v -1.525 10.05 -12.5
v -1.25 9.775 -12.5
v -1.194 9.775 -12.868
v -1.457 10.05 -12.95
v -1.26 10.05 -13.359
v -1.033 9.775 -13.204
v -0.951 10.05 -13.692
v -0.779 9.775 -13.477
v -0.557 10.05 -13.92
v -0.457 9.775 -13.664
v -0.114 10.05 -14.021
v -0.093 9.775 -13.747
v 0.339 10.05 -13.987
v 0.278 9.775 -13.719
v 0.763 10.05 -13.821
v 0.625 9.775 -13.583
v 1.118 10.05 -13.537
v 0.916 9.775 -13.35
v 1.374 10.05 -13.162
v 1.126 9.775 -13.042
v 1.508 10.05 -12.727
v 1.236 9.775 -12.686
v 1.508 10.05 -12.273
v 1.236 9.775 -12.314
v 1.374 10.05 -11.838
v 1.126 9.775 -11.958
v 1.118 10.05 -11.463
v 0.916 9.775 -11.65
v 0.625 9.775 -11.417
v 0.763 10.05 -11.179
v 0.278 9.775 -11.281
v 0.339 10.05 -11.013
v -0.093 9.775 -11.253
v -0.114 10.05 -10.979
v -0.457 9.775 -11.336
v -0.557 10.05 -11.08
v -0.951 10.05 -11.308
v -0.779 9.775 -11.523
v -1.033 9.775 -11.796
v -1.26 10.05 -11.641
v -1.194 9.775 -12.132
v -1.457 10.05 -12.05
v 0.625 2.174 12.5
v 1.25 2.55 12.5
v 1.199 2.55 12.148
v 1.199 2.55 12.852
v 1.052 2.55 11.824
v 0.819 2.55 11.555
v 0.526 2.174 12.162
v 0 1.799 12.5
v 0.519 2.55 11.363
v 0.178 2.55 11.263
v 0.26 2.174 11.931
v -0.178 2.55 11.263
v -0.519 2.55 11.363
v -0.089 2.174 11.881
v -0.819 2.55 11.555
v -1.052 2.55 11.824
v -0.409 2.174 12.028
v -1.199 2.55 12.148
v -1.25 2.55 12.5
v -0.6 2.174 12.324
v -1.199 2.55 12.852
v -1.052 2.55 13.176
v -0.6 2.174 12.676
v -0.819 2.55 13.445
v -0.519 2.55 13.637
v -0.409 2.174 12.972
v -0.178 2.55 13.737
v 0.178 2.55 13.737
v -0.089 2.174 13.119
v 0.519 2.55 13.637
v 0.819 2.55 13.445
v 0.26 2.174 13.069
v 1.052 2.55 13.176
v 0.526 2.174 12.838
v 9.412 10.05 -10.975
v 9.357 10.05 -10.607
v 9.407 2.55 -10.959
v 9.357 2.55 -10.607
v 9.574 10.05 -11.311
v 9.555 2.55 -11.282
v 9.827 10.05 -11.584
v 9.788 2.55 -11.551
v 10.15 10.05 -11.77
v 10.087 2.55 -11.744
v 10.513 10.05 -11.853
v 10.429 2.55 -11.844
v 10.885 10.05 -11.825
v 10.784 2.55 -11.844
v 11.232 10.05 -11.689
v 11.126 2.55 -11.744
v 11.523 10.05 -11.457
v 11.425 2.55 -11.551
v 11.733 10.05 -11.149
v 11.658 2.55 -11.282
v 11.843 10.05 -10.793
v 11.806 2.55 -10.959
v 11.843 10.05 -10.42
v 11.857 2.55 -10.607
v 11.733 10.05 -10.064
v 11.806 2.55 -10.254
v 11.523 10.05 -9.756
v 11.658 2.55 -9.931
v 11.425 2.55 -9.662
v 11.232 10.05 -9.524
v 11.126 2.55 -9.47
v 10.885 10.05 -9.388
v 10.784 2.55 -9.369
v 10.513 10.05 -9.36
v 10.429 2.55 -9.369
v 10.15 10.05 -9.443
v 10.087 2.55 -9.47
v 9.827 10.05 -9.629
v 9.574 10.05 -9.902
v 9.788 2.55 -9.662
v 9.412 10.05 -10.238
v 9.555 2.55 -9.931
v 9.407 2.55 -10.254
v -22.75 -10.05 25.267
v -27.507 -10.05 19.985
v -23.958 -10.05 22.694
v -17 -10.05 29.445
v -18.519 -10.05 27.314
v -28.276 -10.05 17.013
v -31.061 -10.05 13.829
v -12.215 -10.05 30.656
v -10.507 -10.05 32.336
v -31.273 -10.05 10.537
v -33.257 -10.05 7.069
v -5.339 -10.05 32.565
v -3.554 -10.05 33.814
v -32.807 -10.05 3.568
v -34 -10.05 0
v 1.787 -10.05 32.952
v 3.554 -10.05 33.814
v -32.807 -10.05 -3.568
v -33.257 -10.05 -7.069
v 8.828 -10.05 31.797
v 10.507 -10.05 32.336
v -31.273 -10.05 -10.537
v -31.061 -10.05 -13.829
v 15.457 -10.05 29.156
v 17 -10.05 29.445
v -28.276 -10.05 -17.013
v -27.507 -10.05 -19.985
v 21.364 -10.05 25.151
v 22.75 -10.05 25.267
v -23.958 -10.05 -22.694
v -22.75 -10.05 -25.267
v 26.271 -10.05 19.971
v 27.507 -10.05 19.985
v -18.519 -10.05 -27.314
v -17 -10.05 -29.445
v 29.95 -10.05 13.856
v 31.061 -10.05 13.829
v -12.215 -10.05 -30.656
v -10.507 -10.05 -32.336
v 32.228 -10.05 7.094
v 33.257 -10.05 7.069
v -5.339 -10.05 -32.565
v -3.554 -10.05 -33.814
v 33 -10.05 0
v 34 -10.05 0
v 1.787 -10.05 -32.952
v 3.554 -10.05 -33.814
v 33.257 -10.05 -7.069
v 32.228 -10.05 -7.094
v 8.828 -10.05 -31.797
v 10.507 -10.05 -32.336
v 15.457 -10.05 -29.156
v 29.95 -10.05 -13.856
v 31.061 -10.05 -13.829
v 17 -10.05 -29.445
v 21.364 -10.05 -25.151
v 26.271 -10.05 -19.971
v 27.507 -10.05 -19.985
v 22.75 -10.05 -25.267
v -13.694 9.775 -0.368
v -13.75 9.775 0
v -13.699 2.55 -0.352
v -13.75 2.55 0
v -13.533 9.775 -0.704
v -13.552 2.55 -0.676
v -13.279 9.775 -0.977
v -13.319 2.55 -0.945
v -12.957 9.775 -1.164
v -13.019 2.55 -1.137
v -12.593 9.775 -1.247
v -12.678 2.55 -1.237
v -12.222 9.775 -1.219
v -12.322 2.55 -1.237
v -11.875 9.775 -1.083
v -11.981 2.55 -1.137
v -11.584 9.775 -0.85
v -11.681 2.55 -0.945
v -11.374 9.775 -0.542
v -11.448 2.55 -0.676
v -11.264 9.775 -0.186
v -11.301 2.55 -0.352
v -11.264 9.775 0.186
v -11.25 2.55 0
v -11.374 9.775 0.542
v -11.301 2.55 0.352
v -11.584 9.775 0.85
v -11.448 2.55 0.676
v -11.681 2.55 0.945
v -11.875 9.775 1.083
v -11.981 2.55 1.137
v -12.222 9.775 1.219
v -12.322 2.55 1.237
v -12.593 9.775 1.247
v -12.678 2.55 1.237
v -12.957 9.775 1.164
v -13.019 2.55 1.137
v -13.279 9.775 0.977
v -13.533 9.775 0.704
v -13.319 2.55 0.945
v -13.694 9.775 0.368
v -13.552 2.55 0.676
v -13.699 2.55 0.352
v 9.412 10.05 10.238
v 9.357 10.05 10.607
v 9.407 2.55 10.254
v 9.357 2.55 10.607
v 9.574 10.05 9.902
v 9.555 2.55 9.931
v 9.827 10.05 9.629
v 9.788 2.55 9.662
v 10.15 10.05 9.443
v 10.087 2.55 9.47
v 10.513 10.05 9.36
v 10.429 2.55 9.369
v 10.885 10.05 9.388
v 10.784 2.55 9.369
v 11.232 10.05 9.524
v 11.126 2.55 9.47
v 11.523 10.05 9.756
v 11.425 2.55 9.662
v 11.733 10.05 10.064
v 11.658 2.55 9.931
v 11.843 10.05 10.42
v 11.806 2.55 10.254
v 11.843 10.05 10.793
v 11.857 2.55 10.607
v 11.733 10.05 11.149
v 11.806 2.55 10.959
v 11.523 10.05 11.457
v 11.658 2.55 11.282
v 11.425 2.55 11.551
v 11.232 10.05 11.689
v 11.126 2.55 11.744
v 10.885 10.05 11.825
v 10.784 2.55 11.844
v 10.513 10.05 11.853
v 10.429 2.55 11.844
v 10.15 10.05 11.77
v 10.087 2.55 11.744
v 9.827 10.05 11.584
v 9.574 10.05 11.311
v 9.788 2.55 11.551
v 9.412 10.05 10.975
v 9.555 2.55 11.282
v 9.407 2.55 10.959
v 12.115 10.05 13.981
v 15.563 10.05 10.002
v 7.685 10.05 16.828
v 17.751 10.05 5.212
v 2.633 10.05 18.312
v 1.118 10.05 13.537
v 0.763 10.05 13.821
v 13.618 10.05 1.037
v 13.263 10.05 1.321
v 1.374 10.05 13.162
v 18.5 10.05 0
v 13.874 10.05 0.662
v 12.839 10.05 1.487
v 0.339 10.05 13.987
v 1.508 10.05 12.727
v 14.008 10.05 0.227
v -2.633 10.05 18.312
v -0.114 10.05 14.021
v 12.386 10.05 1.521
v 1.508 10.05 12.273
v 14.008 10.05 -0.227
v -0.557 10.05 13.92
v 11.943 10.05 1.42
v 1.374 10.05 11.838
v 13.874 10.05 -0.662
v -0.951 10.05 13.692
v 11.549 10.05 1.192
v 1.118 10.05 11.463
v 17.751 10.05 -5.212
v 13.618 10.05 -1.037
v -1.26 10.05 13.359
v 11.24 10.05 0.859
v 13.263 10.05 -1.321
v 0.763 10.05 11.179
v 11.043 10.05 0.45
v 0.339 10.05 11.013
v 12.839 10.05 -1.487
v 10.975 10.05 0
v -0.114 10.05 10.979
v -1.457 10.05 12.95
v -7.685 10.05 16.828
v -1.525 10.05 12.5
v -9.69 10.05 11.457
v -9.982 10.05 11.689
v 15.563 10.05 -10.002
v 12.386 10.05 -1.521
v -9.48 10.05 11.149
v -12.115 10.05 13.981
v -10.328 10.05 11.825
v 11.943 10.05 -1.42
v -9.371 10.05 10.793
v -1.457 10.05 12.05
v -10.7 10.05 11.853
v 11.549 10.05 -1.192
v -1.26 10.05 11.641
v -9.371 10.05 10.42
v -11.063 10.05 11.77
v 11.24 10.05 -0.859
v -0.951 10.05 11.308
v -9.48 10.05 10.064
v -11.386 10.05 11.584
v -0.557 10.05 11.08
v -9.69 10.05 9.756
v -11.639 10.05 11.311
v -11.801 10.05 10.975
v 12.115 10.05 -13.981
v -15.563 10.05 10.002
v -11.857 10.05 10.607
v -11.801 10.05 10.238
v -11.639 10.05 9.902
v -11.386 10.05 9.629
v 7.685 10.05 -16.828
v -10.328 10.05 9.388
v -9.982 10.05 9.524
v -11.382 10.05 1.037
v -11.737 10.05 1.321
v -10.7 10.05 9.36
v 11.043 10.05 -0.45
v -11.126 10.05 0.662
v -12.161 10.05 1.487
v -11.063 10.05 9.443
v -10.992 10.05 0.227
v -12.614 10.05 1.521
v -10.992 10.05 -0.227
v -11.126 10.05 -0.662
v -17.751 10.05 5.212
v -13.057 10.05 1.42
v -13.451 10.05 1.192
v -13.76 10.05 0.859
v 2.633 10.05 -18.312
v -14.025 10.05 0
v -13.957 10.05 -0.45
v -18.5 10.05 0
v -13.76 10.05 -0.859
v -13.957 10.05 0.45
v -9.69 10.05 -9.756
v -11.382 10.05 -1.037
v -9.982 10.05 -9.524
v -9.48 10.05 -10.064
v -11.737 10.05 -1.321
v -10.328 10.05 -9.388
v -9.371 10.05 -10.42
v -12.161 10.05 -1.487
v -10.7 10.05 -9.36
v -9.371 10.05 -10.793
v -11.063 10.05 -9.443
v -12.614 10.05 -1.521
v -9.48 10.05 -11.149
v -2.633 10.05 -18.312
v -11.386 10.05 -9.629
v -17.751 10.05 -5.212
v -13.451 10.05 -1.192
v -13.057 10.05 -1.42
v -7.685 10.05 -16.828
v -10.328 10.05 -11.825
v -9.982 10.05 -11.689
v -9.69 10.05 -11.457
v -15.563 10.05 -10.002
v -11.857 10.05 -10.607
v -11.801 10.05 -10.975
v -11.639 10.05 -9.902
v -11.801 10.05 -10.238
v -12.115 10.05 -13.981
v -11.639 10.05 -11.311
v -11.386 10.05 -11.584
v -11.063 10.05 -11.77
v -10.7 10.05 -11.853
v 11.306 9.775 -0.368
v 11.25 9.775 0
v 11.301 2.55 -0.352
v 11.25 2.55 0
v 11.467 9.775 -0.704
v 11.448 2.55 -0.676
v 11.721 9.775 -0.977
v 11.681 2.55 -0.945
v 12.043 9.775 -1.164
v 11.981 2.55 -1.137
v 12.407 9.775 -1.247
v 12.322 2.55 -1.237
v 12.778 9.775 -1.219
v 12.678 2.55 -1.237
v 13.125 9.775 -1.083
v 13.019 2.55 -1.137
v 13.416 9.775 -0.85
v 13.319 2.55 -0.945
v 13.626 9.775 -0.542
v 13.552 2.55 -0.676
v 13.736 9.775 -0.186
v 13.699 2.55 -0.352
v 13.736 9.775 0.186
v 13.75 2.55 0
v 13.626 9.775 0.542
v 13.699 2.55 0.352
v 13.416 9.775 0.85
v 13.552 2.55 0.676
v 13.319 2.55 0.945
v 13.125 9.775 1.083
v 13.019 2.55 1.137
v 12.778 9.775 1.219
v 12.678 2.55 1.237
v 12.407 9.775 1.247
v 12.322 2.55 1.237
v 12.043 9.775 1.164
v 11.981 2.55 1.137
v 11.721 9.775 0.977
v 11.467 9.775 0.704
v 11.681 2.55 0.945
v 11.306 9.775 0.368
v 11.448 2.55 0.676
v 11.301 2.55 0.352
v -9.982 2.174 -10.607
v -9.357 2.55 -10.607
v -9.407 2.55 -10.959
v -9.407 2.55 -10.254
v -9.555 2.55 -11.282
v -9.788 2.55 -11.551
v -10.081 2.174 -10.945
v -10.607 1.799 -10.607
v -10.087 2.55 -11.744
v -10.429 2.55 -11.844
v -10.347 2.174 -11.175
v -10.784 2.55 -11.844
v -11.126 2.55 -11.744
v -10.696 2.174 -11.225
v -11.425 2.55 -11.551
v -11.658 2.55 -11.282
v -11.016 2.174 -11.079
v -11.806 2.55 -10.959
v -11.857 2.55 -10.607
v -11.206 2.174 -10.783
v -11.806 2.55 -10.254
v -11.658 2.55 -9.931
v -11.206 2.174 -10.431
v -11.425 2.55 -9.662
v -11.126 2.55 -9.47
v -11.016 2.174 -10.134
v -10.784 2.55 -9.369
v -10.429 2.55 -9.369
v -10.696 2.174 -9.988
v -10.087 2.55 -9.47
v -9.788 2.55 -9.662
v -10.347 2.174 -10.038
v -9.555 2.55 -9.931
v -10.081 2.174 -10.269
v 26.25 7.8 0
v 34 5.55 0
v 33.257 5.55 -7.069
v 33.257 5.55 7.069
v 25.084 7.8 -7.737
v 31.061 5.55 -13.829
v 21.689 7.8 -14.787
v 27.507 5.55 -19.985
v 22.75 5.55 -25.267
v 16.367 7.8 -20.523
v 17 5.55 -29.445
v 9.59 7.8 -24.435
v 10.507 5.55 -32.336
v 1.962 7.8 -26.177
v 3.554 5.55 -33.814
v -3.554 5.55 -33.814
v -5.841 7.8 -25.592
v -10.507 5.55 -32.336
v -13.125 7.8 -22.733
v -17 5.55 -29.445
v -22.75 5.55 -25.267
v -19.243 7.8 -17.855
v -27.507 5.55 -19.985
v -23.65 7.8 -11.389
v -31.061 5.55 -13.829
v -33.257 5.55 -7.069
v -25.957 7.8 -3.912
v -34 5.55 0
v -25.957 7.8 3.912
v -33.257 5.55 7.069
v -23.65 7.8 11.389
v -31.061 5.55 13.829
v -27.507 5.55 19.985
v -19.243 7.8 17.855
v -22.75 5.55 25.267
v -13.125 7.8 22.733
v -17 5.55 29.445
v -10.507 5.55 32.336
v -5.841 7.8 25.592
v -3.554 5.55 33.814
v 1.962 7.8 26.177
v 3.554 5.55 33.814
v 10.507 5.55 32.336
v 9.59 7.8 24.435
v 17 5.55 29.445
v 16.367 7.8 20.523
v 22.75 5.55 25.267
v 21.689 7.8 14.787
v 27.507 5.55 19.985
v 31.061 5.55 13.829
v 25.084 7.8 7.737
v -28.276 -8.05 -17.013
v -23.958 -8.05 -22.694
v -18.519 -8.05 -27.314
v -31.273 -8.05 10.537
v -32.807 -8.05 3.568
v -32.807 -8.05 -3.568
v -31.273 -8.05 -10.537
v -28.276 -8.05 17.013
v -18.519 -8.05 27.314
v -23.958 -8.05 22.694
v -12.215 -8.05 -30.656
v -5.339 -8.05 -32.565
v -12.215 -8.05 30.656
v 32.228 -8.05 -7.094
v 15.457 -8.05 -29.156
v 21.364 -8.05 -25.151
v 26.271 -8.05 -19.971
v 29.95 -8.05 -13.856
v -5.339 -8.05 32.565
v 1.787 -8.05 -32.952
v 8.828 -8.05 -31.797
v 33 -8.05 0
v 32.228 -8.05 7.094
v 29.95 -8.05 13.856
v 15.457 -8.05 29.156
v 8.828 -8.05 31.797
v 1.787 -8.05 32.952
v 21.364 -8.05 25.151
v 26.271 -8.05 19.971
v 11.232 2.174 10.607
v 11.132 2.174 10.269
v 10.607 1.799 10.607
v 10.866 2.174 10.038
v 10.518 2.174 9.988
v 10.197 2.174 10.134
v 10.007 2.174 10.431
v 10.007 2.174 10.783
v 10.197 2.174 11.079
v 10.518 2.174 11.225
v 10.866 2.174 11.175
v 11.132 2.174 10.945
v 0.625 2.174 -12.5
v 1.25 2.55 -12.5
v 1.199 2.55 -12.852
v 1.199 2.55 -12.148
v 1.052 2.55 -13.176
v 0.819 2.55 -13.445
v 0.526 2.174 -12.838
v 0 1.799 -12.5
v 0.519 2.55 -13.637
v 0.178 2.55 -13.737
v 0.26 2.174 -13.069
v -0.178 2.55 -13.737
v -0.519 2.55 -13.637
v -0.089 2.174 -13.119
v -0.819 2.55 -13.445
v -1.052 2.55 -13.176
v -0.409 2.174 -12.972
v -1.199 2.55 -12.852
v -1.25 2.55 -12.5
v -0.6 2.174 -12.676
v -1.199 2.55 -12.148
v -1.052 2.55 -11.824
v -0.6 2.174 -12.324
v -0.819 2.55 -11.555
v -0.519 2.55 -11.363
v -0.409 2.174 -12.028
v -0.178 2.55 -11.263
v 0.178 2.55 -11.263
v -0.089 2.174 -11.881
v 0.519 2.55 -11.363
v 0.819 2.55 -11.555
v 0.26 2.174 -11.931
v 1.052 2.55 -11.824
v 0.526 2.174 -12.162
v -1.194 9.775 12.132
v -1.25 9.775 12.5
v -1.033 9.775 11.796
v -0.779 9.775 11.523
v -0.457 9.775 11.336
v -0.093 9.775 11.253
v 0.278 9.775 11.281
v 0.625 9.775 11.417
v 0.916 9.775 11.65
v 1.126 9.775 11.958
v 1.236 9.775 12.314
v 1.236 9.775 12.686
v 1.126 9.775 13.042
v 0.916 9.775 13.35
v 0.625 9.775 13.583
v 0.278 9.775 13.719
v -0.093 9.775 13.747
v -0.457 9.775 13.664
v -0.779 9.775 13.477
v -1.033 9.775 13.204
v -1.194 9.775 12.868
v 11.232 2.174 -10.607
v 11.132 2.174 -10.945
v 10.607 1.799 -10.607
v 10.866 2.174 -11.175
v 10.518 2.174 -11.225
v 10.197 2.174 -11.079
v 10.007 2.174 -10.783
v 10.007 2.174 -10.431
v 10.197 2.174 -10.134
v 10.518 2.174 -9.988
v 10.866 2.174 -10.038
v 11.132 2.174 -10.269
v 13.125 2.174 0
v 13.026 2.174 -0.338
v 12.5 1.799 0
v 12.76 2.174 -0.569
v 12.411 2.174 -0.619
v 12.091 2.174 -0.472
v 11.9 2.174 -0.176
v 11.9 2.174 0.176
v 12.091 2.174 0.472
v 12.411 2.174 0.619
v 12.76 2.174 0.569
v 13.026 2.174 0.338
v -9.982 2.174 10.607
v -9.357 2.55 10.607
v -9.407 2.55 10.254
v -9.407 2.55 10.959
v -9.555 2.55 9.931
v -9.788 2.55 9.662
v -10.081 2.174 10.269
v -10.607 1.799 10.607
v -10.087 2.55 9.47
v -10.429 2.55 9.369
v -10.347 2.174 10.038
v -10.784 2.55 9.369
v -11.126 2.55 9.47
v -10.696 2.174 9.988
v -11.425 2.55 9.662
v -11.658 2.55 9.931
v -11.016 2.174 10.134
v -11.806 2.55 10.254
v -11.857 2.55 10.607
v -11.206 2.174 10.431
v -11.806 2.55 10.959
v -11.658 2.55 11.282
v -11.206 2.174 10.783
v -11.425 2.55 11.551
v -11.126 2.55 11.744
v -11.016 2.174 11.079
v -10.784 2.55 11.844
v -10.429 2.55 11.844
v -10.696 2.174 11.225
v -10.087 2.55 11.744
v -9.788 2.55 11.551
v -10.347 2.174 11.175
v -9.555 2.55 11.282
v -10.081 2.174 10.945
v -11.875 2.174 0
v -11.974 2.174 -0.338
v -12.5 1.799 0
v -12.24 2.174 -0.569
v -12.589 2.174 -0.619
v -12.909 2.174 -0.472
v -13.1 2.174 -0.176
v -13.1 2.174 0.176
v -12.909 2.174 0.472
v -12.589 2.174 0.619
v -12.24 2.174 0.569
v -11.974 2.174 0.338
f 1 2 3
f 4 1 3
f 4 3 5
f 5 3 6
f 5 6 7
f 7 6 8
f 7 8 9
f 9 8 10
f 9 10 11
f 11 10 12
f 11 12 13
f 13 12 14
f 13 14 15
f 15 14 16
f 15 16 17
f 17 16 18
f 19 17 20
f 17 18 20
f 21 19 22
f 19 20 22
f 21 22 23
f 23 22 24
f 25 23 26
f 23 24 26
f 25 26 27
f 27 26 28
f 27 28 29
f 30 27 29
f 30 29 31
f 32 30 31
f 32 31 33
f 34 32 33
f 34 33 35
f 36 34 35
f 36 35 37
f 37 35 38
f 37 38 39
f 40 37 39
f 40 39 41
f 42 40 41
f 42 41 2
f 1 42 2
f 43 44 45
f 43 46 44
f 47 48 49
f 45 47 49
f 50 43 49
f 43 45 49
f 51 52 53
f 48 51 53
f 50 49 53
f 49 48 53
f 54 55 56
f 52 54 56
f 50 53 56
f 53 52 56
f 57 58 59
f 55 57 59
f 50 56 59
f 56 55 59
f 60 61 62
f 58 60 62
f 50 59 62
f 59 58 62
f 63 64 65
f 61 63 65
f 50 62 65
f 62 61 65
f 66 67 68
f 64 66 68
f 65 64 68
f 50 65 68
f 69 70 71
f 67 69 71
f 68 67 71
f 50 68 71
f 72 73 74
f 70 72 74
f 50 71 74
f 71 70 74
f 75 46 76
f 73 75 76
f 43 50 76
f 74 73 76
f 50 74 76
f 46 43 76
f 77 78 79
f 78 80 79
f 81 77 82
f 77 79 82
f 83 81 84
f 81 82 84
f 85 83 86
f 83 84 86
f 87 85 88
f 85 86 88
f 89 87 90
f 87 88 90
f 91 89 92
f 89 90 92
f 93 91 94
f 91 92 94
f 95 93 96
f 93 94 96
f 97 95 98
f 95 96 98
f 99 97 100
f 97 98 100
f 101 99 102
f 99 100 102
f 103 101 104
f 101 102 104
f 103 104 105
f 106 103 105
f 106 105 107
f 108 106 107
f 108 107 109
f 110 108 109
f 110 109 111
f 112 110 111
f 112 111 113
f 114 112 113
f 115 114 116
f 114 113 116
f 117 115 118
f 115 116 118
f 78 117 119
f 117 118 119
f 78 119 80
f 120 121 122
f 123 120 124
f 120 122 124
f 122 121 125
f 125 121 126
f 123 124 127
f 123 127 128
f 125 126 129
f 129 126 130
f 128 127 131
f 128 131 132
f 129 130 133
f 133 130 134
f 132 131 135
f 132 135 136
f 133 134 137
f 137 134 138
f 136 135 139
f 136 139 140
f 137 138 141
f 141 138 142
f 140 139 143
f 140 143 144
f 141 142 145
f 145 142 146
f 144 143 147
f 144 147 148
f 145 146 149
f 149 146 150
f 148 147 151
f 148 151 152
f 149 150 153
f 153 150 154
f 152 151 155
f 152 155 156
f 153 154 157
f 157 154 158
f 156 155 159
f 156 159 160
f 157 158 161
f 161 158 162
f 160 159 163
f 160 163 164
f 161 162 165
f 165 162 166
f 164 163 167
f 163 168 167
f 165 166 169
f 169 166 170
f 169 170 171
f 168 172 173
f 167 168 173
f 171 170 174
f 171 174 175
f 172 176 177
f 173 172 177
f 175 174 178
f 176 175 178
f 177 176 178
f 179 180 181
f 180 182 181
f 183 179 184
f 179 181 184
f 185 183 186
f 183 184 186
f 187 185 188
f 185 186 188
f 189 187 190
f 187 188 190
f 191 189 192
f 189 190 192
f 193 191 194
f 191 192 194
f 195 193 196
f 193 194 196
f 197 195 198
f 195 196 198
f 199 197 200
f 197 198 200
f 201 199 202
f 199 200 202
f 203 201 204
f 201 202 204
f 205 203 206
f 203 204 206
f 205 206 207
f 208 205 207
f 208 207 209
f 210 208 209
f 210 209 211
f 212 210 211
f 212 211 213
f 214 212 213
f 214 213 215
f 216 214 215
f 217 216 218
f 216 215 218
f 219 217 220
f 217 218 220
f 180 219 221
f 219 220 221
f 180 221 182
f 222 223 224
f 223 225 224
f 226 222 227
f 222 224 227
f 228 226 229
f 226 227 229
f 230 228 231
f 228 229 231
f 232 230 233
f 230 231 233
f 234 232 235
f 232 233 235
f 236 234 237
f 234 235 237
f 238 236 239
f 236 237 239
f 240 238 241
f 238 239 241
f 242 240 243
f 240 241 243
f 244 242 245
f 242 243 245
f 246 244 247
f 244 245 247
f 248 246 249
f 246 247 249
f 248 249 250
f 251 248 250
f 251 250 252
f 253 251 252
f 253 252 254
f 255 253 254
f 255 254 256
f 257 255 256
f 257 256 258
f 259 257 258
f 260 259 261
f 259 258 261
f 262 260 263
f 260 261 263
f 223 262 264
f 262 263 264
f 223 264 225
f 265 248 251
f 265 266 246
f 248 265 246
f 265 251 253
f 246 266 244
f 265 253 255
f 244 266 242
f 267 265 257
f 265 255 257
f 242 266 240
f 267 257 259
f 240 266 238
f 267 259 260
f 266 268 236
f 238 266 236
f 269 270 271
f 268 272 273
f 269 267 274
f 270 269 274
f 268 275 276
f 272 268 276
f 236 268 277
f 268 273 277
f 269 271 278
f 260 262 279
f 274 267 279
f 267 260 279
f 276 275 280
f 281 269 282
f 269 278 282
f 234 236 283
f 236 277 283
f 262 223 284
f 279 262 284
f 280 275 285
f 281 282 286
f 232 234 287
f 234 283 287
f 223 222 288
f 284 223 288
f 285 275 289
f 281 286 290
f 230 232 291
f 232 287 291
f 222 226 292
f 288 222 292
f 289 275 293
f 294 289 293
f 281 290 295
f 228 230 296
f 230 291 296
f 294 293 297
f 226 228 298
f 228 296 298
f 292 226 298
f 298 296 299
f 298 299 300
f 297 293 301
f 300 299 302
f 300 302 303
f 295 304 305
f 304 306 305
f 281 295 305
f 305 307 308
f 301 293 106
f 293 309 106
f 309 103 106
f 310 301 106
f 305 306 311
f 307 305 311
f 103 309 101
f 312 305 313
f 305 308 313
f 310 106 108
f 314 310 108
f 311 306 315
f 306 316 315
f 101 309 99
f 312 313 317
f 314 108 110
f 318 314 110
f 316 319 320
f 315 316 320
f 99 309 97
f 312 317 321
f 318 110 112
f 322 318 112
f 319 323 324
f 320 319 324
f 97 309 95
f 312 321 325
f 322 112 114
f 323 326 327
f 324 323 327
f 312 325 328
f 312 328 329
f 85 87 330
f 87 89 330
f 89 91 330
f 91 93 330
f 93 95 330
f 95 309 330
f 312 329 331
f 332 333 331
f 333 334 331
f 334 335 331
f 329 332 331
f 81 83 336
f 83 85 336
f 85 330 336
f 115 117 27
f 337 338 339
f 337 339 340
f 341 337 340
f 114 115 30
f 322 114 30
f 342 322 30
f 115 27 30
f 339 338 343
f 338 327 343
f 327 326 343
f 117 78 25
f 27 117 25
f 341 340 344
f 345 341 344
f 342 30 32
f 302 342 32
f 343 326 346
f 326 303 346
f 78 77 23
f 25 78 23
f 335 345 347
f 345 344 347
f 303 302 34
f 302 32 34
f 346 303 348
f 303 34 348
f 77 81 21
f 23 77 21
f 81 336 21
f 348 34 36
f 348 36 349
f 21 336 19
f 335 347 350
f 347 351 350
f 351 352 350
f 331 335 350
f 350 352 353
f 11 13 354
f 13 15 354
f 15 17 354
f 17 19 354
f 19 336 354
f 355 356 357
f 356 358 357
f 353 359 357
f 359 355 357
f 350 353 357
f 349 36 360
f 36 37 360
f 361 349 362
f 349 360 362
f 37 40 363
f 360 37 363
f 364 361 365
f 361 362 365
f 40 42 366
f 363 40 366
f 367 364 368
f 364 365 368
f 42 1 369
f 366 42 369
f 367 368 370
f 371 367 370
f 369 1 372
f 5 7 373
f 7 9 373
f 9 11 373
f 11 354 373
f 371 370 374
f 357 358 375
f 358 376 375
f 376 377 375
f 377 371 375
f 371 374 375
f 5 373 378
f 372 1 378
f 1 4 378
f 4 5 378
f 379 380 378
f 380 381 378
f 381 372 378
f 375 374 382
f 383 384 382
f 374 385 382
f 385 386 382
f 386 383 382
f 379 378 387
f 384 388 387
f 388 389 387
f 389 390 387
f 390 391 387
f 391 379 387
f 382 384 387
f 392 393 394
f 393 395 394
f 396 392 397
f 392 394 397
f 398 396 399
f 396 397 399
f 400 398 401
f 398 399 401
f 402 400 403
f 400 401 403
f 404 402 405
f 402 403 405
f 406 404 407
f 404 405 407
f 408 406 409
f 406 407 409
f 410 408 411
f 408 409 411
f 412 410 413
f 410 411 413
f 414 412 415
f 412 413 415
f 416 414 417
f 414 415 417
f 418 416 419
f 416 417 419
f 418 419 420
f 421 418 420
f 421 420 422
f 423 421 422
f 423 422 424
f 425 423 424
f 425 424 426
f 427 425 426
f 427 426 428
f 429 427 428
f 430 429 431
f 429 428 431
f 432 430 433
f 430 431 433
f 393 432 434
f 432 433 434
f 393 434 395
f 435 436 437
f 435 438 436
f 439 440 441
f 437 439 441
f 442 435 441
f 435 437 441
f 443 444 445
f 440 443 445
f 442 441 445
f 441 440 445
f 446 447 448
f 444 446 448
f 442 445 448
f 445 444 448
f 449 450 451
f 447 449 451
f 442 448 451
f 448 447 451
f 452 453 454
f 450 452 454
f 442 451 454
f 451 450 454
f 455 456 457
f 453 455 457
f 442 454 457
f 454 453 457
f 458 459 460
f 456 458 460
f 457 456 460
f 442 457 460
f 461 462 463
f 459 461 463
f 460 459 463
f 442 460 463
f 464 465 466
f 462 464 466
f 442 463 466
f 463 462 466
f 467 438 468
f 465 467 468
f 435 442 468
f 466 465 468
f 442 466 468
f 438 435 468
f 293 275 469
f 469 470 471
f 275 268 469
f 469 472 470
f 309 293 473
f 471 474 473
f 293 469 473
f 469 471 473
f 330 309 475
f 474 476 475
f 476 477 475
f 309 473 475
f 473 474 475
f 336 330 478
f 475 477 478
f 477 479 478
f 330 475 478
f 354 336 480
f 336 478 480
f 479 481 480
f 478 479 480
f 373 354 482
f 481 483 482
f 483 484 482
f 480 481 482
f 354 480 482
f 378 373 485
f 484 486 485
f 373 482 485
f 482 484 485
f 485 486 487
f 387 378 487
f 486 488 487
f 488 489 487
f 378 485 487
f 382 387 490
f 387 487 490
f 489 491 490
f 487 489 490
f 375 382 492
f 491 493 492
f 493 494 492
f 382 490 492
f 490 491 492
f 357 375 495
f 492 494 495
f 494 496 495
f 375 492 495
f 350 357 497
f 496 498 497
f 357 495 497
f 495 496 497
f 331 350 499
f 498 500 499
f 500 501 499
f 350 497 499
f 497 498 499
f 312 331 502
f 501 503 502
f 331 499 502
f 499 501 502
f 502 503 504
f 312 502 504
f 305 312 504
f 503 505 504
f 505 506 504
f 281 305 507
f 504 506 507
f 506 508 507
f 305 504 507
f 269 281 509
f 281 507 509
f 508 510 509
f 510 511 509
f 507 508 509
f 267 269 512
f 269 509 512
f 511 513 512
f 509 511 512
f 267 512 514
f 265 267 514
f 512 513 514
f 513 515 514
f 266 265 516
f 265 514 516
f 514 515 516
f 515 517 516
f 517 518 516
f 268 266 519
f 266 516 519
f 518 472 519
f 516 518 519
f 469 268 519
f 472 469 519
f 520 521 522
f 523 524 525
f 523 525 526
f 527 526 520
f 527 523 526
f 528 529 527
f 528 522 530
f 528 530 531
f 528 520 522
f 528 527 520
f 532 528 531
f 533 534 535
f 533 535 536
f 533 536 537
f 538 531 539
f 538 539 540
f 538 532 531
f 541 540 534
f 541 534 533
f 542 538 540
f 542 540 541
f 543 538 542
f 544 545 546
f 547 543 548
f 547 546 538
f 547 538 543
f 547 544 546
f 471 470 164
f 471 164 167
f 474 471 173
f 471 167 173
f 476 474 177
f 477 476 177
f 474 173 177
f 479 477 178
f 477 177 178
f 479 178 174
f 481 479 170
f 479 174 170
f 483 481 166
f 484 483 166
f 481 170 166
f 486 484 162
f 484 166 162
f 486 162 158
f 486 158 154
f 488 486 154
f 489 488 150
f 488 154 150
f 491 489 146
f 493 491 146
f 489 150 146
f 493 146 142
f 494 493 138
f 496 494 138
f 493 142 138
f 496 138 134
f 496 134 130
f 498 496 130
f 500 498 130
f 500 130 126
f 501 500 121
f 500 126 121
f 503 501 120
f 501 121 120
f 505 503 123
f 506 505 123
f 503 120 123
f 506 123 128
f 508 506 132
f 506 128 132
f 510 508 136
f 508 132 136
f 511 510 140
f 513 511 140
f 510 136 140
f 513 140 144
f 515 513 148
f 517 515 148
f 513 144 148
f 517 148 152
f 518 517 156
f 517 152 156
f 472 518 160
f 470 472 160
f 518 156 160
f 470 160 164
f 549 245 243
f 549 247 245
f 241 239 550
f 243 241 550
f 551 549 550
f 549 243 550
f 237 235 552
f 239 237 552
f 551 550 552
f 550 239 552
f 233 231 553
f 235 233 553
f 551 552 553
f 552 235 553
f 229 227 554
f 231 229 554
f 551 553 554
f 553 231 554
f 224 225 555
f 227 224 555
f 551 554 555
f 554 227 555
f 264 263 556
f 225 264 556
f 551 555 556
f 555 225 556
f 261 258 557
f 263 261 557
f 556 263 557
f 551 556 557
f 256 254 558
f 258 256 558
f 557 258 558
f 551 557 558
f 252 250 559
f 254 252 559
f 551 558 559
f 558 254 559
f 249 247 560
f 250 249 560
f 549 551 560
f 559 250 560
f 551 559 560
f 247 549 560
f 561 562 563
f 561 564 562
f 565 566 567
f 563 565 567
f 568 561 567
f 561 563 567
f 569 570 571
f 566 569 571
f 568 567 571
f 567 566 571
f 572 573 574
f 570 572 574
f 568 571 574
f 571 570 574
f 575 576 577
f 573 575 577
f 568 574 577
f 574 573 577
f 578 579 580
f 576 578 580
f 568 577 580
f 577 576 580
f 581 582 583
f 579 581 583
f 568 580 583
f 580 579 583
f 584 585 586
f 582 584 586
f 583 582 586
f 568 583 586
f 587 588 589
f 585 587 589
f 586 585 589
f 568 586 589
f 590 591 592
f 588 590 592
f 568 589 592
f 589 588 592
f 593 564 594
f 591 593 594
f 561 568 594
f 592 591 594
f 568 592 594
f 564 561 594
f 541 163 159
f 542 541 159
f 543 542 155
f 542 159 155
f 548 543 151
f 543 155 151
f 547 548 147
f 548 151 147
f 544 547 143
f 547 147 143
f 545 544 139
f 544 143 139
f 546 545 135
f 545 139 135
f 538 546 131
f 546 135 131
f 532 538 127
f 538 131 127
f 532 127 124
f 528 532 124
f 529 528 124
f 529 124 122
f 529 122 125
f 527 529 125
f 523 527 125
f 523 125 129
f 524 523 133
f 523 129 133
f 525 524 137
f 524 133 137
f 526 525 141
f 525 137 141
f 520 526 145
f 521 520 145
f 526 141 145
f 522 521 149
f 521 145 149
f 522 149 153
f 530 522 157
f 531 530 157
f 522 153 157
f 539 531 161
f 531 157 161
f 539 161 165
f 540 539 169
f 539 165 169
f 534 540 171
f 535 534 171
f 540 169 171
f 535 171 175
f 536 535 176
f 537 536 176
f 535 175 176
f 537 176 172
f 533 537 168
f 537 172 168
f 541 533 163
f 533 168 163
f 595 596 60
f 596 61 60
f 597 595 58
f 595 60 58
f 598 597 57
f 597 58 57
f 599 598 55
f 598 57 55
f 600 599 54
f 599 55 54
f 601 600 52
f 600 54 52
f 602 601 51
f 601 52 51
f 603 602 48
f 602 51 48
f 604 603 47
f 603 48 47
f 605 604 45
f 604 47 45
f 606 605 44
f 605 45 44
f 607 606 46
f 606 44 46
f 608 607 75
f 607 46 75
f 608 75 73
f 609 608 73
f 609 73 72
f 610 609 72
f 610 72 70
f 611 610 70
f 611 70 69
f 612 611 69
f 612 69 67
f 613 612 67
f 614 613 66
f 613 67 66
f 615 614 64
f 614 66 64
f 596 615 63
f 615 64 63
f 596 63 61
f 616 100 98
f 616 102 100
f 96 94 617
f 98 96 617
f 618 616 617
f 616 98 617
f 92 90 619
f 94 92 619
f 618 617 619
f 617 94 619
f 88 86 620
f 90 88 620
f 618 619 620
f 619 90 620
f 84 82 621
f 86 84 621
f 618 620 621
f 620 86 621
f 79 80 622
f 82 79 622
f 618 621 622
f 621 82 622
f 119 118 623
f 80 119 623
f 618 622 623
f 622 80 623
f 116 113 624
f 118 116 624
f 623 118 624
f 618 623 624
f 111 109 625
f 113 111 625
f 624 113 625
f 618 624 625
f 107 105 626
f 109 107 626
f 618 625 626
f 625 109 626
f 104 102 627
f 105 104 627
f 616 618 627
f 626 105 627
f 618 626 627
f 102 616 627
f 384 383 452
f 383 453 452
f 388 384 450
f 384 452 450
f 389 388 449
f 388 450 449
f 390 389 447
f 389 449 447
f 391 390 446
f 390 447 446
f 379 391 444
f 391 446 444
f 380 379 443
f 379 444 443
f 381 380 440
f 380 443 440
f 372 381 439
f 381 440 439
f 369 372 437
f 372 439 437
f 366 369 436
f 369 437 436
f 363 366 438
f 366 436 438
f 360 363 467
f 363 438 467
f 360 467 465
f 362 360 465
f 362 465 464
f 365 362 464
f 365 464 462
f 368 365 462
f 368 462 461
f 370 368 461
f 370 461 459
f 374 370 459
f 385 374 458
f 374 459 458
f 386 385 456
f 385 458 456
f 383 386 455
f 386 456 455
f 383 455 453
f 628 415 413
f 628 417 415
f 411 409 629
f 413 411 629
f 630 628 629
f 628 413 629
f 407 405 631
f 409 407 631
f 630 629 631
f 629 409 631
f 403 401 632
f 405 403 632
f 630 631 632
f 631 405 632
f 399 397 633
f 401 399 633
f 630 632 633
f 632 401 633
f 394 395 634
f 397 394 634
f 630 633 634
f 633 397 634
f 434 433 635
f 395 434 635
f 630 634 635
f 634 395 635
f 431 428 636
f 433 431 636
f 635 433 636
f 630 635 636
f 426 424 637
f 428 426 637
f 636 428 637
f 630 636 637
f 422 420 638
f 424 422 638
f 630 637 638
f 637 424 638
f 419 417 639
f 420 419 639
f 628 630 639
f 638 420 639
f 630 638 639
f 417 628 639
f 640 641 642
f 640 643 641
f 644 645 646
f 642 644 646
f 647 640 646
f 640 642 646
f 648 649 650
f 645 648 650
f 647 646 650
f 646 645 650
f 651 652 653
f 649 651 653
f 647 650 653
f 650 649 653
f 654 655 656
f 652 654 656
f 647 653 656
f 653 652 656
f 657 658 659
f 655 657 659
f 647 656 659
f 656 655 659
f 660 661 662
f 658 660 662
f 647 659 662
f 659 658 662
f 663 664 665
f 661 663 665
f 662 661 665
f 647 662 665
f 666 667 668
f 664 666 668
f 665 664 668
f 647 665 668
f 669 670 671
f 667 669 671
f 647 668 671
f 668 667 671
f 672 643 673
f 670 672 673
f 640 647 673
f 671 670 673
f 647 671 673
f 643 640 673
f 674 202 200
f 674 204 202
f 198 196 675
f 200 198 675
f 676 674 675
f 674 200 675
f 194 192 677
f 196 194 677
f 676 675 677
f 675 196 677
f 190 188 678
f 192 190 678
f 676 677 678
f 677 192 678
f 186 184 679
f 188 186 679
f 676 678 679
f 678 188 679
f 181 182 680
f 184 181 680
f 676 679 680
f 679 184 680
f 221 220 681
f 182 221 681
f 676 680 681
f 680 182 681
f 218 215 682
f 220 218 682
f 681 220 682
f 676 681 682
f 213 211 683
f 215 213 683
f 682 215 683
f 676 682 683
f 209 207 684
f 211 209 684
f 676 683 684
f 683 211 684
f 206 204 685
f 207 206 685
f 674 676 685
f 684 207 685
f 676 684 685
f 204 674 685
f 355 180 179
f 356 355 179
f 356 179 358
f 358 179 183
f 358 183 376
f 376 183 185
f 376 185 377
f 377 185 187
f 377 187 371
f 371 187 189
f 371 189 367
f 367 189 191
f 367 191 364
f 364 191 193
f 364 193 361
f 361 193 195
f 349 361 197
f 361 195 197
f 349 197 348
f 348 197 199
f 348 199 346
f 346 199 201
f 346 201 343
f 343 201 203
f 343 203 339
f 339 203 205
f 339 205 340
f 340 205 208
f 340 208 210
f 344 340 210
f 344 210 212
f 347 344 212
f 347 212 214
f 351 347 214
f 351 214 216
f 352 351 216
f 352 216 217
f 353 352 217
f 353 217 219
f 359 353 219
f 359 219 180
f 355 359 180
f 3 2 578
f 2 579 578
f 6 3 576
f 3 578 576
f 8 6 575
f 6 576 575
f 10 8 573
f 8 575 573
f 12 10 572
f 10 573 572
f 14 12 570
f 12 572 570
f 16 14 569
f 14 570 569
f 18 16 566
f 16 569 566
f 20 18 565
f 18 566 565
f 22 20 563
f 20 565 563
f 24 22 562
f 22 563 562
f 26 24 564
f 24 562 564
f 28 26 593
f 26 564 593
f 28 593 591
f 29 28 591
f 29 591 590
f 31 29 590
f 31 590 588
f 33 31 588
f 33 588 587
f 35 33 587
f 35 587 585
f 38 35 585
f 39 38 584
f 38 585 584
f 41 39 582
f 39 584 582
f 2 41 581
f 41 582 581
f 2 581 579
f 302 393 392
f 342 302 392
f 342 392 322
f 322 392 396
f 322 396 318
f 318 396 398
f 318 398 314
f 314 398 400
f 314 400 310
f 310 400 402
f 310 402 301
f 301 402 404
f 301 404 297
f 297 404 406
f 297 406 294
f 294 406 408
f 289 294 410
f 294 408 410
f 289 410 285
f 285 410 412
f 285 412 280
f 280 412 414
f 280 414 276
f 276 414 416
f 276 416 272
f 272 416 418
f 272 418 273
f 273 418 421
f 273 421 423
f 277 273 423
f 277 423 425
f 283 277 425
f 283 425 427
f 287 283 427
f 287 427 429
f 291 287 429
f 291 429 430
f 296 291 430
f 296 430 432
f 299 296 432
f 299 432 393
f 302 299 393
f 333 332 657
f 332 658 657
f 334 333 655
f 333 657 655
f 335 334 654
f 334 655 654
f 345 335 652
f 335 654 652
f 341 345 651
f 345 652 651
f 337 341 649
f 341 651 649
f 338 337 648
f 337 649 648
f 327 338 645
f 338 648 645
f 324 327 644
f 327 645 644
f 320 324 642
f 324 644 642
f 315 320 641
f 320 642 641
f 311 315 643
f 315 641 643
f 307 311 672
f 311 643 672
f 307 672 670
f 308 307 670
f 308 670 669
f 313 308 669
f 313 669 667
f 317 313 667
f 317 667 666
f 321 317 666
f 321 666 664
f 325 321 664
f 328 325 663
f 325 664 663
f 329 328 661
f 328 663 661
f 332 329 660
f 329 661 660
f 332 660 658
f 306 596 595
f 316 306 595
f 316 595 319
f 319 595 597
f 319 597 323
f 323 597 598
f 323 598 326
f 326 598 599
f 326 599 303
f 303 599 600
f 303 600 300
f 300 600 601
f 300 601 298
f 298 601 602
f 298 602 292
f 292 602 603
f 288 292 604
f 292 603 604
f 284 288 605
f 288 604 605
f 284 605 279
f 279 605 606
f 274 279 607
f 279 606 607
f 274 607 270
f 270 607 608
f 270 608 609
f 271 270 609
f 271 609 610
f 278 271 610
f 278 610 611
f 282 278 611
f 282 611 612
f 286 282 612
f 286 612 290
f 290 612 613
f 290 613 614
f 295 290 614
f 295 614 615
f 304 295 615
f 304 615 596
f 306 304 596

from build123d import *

# Parameters (mm, degrees)
SKETCH4_R                       = 33
CUT_EXTRUDE1_DEPTH              = 2
M3X0_5_TAPPED_HOLE1_D           = 2.5
M3X0_5_TAPPED_HOLE1_DEPTH       = 7.5
M3X0_5_TAPPED_HOLE1_TIP         = 0.751075774
M3X0_5_TAPPED_HOLE2_D           = 2.5
M3X0_5_TAPPED_HOLE2_DEPTH       = 7.5
M3X0_5_TAPPED_HOLE2_CSINK_D     = 3.05
M3X0_5_TAPPED_HOLE2_CSINK_ANGLE = 90
M3X0_5_TAPPED_HOLE2_TIP         = 0.751075774


with BuildPart() as part:
    # Sketch3 → Revolve1 (revolve)
    with BuildSketch(Plane.XY):
        Polygon((0, -10.05), (0, 10.05), (18.5, 10.05), (34, 5.55), (34, -10.05), align=None)
    revolve(axis=Axis((0, -10.05, 0), (0, 1, 0)))

    # Sketch4 → Cut-Extrude1 (cut)
    with BuildSketch(Plane.XZ.offset(10.05)):
        Circle(SKETCH4_R)
    extrude(amount=-CUT_EXTRUDE1_DEPTH, mode=Mode.SUBTRACT)

    # M3x0.5 Tapped Hole1
    with Locations(Plane(origin=(0, 10.05, 0), x_dir=(1, 0, 0), z_dir=(0, 1, 0))):
        with Locations((-10.606601718, 10.606601718), (10.606601718, 10.606601718), (10.606601718, -10.606601718), (-10.606601718, -10.606601718)):
            Hole(M3X0_5_TAPPED_HOLE1_D / 2, depth=M3X0_5_TAPPED_HOLE1_DEPTH)
            with Locations((0, 0, -(M3X0_5_TAPPED_HOLE1_DEPTH + M3X0_5_TAPPED_HOLE1_TIP / 2))):  # 118° drill point
                Cone(0, M3X0_5_TAPPED_HOLE1_D / 2, M3X0_5_TAPPED_HOLE1_TIP, mode=Mode.SUBTRACT)

    # M3x0.5 Tapped Hole2
    with Locations(Plane(origin=(0, 10.05, 0), x_dir=(1, 0, 0), z_dir=(0, 1, 0))):
        with Locations((0, 12.5), (0, -12.5), (-12.5, 0), (12.5, 0)):
            CounterSinkHole(M3X0_5_TAPPED_HOLE2_D / 2, M3X0_5_TAPPED_HOLE2_CSINK_D / 2, depth=M3X0_5_TAPPED_HOLE2_DEPTH, counter_sink_angle=M3X0_5_TAPPED_HOLE2_CSINK_ANGLE)
            with Locations((0, 0, -(M3X0_5_TAPPED_HOLE2_DEPTH + M3X0_5_TAPPED_HOLE2_TIP / 2))):  # 118° drill point
                Cone(0, M3X0_5_TAPPED_HOLE2_D / 2, M3X0_5_TAPPED_HOLE2_TIP, mode=Mode.SUBTRACT)


solid = part.part
